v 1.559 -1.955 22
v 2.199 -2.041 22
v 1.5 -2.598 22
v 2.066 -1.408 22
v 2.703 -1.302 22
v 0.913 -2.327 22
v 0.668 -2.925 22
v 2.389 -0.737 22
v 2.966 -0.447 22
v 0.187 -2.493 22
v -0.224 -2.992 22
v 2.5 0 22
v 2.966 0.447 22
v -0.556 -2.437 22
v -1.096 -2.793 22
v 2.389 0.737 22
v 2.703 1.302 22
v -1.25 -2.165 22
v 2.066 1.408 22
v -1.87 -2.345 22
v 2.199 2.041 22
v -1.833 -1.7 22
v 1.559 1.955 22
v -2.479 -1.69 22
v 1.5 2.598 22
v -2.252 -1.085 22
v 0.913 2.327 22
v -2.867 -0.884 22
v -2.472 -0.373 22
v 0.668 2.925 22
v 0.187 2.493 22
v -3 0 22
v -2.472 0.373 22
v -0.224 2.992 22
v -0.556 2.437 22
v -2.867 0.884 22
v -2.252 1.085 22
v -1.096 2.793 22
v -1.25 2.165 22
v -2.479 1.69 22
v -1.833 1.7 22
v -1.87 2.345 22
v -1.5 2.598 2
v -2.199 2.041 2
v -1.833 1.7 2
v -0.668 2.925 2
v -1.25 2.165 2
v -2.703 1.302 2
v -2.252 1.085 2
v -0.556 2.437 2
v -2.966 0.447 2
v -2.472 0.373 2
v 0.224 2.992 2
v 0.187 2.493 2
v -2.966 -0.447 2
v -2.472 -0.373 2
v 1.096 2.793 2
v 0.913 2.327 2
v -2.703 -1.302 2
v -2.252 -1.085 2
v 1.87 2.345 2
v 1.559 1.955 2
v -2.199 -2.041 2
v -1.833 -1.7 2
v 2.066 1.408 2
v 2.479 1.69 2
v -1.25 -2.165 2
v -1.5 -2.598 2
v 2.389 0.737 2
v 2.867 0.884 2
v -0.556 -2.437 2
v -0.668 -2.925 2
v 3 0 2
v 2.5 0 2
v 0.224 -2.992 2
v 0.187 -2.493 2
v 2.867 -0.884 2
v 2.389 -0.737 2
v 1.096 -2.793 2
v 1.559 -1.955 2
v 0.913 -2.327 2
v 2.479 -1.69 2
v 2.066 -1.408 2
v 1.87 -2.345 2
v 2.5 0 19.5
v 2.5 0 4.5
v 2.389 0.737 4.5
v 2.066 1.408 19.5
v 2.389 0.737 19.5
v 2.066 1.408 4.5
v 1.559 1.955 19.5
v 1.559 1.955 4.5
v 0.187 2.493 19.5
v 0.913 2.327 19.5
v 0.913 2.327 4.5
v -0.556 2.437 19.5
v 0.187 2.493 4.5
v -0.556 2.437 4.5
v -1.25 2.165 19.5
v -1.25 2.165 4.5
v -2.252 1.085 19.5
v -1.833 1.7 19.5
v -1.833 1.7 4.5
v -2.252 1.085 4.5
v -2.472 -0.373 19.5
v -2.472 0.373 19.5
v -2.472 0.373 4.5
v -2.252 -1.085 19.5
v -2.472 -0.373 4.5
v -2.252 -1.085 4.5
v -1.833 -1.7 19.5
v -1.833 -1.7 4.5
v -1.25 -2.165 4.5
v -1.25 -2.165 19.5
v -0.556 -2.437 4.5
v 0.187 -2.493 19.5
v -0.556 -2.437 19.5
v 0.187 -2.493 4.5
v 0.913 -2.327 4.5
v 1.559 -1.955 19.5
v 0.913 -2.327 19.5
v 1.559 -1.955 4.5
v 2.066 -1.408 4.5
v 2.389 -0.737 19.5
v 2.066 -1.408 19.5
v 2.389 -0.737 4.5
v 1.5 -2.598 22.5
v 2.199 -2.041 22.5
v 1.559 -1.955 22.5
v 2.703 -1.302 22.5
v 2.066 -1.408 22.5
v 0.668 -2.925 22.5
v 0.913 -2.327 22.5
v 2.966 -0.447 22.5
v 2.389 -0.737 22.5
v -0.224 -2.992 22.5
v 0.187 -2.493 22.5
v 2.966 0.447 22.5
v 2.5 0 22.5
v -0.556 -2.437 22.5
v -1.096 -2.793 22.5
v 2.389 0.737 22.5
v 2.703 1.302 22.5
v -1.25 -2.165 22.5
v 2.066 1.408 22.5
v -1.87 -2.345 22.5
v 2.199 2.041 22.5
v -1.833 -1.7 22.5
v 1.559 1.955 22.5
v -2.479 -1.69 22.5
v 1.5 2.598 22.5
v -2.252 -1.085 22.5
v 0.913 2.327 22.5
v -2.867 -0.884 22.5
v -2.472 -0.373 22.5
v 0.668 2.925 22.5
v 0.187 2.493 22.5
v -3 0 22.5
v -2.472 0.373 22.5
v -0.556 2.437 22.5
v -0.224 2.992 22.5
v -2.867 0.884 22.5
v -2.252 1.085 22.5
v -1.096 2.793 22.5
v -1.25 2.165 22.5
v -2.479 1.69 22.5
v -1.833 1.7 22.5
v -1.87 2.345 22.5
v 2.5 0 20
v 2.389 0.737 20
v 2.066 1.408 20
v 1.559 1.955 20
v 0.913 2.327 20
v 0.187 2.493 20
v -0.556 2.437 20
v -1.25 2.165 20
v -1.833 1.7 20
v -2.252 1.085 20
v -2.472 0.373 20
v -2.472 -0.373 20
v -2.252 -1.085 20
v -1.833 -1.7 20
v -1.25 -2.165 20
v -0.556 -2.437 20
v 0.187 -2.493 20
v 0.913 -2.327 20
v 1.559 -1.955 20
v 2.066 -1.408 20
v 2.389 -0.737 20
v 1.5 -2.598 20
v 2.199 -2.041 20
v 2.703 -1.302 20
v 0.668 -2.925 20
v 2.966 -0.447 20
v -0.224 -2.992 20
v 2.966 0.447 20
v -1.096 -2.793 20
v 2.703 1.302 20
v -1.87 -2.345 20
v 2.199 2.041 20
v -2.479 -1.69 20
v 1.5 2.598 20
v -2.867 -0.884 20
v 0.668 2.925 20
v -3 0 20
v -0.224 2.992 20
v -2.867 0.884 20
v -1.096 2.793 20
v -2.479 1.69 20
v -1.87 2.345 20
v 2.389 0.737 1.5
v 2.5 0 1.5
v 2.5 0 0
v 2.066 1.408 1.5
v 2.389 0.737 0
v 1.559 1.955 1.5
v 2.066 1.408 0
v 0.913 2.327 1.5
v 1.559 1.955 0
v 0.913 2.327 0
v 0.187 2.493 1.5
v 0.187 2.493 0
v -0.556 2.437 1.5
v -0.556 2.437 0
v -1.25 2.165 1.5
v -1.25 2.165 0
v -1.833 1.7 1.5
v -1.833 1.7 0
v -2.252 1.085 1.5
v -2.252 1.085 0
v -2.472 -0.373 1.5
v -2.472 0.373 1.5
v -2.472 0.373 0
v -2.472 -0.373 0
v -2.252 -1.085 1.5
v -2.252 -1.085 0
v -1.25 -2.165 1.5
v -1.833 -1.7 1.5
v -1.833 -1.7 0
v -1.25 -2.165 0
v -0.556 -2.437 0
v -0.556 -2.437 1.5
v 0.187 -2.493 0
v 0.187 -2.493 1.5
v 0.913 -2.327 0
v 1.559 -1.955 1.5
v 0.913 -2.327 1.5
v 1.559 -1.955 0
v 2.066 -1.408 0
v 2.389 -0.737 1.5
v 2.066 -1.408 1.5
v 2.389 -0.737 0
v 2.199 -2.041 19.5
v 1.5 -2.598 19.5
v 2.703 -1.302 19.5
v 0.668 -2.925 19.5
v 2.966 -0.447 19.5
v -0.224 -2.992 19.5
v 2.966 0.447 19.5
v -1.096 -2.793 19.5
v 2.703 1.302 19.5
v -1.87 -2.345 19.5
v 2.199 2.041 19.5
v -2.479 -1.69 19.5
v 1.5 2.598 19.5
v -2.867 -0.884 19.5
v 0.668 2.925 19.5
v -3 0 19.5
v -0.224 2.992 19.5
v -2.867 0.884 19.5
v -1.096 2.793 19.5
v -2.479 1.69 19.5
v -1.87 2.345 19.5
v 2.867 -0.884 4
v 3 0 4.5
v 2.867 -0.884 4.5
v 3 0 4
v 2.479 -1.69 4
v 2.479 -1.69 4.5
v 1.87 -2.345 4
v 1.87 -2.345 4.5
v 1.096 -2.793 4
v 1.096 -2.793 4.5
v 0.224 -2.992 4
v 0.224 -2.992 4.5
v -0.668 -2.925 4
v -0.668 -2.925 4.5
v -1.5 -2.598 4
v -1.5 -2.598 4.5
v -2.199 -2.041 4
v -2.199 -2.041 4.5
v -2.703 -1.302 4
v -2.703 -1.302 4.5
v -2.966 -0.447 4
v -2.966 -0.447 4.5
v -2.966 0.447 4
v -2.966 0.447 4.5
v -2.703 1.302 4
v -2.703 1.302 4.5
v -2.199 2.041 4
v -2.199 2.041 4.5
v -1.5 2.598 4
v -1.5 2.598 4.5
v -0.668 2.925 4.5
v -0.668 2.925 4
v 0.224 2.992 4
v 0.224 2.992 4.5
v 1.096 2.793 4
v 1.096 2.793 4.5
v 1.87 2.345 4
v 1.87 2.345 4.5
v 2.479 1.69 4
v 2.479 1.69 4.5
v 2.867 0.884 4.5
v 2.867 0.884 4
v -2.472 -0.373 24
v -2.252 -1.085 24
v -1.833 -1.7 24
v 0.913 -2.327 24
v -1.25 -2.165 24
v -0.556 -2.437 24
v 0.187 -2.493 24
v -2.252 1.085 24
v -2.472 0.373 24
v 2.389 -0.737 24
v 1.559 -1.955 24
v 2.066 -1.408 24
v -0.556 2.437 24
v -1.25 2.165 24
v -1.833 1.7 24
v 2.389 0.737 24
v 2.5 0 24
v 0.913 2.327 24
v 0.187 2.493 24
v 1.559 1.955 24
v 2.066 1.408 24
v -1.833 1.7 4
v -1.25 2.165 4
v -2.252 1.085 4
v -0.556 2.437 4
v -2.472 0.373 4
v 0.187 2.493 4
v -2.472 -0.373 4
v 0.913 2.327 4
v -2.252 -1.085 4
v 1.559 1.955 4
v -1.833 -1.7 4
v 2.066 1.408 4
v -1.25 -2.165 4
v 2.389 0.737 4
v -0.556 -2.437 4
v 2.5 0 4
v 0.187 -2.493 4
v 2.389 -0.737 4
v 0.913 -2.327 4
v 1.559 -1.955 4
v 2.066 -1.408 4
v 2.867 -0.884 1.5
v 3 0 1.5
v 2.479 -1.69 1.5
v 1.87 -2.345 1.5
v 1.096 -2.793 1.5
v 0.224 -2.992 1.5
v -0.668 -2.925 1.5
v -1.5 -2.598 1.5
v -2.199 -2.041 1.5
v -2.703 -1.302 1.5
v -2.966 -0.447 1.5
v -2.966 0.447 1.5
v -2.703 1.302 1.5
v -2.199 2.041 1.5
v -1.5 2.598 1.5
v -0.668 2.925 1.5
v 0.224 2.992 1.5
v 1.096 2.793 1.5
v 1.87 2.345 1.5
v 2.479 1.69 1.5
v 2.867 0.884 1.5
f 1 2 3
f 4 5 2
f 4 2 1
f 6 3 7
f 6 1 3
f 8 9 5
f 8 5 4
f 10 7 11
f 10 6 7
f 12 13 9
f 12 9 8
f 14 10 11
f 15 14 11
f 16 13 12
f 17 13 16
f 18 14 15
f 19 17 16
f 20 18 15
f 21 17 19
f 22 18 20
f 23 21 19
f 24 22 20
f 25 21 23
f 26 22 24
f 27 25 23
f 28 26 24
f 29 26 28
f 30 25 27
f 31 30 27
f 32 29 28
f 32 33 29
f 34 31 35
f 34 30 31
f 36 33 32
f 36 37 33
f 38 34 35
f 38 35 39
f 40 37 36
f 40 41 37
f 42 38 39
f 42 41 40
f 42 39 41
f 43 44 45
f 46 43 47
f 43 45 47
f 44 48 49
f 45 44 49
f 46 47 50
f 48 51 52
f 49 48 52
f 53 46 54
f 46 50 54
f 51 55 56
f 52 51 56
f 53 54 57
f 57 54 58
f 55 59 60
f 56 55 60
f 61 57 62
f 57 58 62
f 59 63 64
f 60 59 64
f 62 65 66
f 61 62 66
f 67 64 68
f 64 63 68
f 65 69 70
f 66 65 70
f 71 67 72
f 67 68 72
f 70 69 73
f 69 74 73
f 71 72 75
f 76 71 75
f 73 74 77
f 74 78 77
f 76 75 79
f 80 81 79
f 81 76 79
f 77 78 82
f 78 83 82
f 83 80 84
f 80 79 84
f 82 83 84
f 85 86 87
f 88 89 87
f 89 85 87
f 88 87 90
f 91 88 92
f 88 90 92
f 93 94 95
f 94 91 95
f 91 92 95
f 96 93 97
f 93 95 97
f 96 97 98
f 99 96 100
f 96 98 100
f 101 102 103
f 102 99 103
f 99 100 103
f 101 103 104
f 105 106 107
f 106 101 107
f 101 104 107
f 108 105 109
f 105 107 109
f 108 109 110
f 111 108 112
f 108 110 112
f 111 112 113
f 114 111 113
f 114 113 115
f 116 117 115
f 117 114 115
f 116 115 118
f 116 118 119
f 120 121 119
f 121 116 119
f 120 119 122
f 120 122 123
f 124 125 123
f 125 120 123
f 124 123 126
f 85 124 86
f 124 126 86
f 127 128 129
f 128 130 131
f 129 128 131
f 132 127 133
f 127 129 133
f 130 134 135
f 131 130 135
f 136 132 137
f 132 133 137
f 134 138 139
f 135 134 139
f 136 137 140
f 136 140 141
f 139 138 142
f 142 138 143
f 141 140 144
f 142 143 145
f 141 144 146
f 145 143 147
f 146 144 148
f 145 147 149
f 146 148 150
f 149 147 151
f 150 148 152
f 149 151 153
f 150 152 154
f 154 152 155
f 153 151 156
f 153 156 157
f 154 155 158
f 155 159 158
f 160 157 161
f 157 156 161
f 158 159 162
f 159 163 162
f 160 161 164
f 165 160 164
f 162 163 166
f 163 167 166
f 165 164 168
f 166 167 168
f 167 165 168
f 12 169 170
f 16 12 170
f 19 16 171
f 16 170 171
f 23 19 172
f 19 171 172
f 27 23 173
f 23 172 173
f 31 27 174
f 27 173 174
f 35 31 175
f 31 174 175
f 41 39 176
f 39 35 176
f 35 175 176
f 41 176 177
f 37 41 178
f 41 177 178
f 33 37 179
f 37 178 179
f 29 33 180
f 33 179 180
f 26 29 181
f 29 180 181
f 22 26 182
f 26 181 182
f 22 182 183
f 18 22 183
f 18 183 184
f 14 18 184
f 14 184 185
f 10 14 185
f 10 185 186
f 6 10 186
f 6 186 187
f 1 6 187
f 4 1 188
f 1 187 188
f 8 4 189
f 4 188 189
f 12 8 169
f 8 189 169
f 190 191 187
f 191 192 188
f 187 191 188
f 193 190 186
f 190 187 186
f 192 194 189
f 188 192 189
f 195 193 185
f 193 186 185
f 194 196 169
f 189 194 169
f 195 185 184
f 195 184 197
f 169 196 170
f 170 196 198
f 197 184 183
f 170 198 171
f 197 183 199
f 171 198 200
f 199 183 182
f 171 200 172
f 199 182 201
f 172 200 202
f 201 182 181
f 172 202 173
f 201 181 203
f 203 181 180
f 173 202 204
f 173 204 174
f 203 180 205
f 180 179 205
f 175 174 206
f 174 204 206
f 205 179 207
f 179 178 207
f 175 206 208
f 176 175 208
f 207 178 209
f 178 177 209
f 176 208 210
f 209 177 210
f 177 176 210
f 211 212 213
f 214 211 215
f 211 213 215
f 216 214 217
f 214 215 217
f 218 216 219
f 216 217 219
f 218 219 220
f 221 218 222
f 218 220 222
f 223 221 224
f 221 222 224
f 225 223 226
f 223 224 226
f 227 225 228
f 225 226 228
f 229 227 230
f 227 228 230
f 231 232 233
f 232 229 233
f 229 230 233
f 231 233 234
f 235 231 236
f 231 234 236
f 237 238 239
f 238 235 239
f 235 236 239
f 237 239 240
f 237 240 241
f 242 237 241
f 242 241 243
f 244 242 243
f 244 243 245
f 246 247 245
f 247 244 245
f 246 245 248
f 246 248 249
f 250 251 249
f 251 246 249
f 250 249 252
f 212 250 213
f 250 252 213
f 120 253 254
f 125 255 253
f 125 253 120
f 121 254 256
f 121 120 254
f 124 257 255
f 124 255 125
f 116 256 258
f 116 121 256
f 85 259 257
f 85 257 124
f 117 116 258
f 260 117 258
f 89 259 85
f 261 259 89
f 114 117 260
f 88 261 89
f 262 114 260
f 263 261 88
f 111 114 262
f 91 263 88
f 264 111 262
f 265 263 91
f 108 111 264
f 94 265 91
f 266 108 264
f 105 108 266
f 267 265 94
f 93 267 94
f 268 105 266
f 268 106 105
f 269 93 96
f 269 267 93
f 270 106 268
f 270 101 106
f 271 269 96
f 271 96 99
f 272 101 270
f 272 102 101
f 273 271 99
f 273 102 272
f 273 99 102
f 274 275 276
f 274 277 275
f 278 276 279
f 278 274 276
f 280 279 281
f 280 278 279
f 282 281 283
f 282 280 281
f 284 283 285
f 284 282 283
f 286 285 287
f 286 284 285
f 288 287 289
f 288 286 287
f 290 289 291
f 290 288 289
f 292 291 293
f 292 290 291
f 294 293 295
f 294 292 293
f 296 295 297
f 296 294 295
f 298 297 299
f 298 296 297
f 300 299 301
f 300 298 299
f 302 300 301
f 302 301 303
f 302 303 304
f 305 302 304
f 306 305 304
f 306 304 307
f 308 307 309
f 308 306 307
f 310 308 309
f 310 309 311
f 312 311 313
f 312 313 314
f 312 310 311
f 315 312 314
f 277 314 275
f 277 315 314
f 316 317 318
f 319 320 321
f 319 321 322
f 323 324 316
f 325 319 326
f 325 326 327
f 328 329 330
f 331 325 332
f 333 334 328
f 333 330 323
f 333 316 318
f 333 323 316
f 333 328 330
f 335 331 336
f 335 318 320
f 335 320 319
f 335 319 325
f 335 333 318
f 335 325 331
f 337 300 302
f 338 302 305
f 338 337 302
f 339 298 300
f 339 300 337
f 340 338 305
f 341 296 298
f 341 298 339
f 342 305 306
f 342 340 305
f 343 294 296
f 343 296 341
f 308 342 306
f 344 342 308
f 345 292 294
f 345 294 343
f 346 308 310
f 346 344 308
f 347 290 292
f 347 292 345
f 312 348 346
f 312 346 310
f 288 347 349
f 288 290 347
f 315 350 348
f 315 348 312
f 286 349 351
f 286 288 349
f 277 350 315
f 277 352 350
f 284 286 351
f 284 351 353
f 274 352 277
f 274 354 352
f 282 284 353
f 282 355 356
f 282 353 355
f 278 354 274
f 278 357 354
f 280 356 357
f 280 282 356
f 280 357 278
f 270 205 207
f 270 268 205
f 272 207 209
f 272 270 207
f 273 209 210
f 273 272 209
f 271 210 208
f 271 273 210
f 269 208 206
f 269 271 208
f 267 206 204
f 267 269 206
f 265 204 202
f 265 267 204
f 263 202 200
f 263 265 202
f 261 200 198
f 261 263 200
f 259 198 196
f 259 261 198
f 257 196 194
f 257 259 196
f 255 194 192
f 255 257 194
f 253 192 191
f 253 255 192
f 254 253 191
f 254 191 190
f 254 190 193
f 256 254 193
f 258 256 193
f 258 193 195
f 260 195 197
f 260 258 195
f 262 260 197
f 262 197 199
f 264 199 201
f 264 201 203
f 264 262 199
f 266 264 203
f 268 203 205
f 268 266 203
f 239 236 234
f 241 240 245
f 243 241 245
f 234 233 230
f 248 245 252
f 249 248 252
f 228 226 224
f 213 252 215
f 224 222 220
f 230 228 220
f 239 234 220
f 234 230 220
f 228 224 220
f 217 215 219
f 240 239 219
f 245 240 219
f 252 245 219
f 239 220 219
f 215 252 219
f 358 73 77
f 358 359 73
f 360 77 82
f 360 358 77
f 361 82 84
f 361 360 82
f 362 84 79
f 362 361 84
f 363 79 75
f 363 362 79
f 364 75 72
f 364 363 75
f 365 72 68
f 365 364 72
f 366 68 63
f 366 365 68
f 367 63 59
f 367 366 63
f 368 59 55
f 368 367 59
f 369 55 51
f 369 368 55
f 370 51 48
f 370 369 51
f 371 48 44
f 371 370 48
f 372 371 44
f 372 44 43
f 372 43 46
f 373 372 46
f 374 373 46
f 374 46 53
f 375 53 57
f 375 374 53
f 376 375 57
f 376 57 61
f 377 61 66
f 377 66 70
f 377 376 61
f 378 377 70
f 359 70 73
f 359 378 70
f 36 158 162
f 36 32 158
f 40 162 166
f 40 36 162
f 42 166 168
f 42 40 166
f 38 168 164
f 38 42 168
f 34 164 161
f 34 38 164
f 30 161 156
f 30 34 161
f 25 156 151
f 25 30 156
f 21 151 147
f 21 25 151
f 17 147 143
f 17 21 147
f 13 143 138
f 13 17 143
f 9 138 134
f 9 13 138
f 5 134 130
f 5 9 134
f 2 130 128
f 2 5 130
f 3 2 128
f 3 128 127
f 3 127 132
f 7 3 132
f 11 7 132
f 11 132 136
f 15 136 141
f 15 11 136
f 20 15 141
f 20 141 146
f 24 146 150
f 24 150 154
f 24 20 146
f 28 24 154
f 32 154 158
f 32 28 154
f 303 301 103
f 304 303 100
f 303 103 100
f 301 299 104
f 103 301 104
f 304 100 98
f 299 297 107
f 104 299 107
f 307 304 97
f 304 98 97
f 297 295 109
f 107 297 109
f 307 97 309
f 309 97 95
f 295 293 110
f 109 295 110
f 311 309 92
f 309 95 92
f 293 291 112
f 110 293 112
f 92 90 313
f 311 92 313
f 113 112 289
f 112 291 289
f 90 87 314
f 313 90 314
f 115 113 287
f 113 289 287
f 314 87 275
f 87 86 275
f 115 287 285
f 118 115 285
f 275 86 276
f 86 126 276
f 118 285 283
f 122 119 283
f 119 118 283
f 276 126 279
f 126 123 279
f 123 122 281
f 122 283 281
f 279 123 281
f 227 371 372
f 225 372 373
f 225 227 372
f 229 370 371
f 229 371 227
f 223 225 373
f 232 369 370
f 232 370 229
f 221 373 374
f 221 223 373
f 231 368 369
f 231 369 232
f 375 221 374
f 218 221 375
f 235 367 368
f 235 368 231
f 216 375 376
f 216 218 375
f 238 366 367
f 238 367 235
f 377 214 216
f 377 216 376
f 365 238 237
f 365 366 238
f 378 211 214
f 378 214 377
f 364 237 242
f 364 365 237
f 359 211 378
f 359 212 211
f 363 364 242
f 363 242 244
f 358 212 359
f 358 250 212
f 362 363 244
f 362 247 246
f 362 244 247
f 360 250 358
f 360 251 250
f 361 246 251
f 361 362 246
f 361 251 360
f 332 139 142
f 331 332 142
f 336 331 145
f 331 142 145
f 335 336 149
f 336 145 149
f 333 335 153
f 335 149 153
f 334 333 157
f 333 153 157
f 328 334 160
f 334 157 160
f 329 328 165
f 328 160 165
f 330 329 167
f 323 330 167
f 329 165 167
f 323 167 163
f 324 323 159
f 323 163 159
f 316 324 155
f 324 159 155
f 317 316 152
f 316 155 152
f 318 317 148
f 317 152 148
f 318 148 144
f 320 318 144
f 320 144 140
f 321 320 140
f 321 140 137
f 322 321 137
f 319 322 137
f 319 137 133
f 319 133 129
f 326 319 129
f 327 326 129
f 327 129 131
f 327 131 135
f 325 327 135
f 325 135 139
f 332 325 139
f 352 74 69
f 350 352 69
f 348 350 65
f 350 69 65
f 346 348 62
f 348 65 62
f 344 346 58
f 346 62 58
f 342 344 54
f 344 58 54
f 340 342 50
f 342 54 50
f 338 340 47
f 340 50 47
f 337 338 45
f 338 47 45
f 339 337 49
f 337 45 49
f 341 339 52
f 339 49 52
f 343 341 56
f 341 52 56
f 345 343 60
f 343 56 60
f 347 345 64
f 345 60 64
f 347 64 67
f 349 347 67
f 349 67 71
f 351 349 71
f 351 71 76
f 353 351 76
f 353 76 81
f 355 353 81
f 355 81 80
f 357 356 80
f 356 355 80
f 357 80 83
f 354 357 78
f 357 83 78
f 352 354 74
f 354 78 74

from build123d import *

# Parameters (mm, degrees)
ESBO_O1_R                = 2.5
RESSALTO_EXTRUS_O1_DEPTH = 24
ESBO_O2_W                = 0.5
ESBO_O2_H                = 3
ESBO_O4_W                = 0.5
ESBO_O4_H                = 3


with BuildPart() as part:
    # Esboço1 → Ressalto-extrusão1 (new body)
    with BuildSketch(Plane.XY):
        Circle(ESBO_O1_R)
    extrude(amount=RESSALTO_EXTRUS_O1_DEPTH)

    # Esboço2 → Revolução1 (revolve)
    with BuildSketch(Plane(origin=(0, 0, 0), x_dir=(0, 0, -1), z_dir=(1, 0, 0)), mode=Mode.PRIVATE) as revolu_o1_sk:
        with Locations((-1.75, -1.5)):
            Rectangle(ESBO_O2_W, ESBO_O2_H)
        with Locations((-4.25, -1.5)):
            Rectangle(ESBO_O2_W, ESBO_O2_H)
    revolve(revolu_o1_sk.sketch.rotate(Axis((0, 0, 2), (0, 0, -1)), 270), axis=Axis((0, 0, 2), (0, 0, -1)))

    # Esboço4 → Revolução2 (revolve)
    with BuildSketch(Plane(origin=(0, 0, 0), x_dir=(0, 0, -1), z_dir=(1, 0, 0)), mode=Mode.PRIVATE) as revolu_o2_sk:
        with Locations((-19.75, -1.5)):
            Rectangle(ESBO_O4_W, ESBO_O4_H)
        with Locations((-22.25, -1.5)):
            Rectangle(ESBO_O4_W, ESBO_O4_H)
    revolve(revolu_o2_sk.sketch.rotate(Axis((0, 0, 20), (0, 0, -1)), 90), axis=Axis((0, 0, 20), (0, 0, -1)))


solid = part.part
